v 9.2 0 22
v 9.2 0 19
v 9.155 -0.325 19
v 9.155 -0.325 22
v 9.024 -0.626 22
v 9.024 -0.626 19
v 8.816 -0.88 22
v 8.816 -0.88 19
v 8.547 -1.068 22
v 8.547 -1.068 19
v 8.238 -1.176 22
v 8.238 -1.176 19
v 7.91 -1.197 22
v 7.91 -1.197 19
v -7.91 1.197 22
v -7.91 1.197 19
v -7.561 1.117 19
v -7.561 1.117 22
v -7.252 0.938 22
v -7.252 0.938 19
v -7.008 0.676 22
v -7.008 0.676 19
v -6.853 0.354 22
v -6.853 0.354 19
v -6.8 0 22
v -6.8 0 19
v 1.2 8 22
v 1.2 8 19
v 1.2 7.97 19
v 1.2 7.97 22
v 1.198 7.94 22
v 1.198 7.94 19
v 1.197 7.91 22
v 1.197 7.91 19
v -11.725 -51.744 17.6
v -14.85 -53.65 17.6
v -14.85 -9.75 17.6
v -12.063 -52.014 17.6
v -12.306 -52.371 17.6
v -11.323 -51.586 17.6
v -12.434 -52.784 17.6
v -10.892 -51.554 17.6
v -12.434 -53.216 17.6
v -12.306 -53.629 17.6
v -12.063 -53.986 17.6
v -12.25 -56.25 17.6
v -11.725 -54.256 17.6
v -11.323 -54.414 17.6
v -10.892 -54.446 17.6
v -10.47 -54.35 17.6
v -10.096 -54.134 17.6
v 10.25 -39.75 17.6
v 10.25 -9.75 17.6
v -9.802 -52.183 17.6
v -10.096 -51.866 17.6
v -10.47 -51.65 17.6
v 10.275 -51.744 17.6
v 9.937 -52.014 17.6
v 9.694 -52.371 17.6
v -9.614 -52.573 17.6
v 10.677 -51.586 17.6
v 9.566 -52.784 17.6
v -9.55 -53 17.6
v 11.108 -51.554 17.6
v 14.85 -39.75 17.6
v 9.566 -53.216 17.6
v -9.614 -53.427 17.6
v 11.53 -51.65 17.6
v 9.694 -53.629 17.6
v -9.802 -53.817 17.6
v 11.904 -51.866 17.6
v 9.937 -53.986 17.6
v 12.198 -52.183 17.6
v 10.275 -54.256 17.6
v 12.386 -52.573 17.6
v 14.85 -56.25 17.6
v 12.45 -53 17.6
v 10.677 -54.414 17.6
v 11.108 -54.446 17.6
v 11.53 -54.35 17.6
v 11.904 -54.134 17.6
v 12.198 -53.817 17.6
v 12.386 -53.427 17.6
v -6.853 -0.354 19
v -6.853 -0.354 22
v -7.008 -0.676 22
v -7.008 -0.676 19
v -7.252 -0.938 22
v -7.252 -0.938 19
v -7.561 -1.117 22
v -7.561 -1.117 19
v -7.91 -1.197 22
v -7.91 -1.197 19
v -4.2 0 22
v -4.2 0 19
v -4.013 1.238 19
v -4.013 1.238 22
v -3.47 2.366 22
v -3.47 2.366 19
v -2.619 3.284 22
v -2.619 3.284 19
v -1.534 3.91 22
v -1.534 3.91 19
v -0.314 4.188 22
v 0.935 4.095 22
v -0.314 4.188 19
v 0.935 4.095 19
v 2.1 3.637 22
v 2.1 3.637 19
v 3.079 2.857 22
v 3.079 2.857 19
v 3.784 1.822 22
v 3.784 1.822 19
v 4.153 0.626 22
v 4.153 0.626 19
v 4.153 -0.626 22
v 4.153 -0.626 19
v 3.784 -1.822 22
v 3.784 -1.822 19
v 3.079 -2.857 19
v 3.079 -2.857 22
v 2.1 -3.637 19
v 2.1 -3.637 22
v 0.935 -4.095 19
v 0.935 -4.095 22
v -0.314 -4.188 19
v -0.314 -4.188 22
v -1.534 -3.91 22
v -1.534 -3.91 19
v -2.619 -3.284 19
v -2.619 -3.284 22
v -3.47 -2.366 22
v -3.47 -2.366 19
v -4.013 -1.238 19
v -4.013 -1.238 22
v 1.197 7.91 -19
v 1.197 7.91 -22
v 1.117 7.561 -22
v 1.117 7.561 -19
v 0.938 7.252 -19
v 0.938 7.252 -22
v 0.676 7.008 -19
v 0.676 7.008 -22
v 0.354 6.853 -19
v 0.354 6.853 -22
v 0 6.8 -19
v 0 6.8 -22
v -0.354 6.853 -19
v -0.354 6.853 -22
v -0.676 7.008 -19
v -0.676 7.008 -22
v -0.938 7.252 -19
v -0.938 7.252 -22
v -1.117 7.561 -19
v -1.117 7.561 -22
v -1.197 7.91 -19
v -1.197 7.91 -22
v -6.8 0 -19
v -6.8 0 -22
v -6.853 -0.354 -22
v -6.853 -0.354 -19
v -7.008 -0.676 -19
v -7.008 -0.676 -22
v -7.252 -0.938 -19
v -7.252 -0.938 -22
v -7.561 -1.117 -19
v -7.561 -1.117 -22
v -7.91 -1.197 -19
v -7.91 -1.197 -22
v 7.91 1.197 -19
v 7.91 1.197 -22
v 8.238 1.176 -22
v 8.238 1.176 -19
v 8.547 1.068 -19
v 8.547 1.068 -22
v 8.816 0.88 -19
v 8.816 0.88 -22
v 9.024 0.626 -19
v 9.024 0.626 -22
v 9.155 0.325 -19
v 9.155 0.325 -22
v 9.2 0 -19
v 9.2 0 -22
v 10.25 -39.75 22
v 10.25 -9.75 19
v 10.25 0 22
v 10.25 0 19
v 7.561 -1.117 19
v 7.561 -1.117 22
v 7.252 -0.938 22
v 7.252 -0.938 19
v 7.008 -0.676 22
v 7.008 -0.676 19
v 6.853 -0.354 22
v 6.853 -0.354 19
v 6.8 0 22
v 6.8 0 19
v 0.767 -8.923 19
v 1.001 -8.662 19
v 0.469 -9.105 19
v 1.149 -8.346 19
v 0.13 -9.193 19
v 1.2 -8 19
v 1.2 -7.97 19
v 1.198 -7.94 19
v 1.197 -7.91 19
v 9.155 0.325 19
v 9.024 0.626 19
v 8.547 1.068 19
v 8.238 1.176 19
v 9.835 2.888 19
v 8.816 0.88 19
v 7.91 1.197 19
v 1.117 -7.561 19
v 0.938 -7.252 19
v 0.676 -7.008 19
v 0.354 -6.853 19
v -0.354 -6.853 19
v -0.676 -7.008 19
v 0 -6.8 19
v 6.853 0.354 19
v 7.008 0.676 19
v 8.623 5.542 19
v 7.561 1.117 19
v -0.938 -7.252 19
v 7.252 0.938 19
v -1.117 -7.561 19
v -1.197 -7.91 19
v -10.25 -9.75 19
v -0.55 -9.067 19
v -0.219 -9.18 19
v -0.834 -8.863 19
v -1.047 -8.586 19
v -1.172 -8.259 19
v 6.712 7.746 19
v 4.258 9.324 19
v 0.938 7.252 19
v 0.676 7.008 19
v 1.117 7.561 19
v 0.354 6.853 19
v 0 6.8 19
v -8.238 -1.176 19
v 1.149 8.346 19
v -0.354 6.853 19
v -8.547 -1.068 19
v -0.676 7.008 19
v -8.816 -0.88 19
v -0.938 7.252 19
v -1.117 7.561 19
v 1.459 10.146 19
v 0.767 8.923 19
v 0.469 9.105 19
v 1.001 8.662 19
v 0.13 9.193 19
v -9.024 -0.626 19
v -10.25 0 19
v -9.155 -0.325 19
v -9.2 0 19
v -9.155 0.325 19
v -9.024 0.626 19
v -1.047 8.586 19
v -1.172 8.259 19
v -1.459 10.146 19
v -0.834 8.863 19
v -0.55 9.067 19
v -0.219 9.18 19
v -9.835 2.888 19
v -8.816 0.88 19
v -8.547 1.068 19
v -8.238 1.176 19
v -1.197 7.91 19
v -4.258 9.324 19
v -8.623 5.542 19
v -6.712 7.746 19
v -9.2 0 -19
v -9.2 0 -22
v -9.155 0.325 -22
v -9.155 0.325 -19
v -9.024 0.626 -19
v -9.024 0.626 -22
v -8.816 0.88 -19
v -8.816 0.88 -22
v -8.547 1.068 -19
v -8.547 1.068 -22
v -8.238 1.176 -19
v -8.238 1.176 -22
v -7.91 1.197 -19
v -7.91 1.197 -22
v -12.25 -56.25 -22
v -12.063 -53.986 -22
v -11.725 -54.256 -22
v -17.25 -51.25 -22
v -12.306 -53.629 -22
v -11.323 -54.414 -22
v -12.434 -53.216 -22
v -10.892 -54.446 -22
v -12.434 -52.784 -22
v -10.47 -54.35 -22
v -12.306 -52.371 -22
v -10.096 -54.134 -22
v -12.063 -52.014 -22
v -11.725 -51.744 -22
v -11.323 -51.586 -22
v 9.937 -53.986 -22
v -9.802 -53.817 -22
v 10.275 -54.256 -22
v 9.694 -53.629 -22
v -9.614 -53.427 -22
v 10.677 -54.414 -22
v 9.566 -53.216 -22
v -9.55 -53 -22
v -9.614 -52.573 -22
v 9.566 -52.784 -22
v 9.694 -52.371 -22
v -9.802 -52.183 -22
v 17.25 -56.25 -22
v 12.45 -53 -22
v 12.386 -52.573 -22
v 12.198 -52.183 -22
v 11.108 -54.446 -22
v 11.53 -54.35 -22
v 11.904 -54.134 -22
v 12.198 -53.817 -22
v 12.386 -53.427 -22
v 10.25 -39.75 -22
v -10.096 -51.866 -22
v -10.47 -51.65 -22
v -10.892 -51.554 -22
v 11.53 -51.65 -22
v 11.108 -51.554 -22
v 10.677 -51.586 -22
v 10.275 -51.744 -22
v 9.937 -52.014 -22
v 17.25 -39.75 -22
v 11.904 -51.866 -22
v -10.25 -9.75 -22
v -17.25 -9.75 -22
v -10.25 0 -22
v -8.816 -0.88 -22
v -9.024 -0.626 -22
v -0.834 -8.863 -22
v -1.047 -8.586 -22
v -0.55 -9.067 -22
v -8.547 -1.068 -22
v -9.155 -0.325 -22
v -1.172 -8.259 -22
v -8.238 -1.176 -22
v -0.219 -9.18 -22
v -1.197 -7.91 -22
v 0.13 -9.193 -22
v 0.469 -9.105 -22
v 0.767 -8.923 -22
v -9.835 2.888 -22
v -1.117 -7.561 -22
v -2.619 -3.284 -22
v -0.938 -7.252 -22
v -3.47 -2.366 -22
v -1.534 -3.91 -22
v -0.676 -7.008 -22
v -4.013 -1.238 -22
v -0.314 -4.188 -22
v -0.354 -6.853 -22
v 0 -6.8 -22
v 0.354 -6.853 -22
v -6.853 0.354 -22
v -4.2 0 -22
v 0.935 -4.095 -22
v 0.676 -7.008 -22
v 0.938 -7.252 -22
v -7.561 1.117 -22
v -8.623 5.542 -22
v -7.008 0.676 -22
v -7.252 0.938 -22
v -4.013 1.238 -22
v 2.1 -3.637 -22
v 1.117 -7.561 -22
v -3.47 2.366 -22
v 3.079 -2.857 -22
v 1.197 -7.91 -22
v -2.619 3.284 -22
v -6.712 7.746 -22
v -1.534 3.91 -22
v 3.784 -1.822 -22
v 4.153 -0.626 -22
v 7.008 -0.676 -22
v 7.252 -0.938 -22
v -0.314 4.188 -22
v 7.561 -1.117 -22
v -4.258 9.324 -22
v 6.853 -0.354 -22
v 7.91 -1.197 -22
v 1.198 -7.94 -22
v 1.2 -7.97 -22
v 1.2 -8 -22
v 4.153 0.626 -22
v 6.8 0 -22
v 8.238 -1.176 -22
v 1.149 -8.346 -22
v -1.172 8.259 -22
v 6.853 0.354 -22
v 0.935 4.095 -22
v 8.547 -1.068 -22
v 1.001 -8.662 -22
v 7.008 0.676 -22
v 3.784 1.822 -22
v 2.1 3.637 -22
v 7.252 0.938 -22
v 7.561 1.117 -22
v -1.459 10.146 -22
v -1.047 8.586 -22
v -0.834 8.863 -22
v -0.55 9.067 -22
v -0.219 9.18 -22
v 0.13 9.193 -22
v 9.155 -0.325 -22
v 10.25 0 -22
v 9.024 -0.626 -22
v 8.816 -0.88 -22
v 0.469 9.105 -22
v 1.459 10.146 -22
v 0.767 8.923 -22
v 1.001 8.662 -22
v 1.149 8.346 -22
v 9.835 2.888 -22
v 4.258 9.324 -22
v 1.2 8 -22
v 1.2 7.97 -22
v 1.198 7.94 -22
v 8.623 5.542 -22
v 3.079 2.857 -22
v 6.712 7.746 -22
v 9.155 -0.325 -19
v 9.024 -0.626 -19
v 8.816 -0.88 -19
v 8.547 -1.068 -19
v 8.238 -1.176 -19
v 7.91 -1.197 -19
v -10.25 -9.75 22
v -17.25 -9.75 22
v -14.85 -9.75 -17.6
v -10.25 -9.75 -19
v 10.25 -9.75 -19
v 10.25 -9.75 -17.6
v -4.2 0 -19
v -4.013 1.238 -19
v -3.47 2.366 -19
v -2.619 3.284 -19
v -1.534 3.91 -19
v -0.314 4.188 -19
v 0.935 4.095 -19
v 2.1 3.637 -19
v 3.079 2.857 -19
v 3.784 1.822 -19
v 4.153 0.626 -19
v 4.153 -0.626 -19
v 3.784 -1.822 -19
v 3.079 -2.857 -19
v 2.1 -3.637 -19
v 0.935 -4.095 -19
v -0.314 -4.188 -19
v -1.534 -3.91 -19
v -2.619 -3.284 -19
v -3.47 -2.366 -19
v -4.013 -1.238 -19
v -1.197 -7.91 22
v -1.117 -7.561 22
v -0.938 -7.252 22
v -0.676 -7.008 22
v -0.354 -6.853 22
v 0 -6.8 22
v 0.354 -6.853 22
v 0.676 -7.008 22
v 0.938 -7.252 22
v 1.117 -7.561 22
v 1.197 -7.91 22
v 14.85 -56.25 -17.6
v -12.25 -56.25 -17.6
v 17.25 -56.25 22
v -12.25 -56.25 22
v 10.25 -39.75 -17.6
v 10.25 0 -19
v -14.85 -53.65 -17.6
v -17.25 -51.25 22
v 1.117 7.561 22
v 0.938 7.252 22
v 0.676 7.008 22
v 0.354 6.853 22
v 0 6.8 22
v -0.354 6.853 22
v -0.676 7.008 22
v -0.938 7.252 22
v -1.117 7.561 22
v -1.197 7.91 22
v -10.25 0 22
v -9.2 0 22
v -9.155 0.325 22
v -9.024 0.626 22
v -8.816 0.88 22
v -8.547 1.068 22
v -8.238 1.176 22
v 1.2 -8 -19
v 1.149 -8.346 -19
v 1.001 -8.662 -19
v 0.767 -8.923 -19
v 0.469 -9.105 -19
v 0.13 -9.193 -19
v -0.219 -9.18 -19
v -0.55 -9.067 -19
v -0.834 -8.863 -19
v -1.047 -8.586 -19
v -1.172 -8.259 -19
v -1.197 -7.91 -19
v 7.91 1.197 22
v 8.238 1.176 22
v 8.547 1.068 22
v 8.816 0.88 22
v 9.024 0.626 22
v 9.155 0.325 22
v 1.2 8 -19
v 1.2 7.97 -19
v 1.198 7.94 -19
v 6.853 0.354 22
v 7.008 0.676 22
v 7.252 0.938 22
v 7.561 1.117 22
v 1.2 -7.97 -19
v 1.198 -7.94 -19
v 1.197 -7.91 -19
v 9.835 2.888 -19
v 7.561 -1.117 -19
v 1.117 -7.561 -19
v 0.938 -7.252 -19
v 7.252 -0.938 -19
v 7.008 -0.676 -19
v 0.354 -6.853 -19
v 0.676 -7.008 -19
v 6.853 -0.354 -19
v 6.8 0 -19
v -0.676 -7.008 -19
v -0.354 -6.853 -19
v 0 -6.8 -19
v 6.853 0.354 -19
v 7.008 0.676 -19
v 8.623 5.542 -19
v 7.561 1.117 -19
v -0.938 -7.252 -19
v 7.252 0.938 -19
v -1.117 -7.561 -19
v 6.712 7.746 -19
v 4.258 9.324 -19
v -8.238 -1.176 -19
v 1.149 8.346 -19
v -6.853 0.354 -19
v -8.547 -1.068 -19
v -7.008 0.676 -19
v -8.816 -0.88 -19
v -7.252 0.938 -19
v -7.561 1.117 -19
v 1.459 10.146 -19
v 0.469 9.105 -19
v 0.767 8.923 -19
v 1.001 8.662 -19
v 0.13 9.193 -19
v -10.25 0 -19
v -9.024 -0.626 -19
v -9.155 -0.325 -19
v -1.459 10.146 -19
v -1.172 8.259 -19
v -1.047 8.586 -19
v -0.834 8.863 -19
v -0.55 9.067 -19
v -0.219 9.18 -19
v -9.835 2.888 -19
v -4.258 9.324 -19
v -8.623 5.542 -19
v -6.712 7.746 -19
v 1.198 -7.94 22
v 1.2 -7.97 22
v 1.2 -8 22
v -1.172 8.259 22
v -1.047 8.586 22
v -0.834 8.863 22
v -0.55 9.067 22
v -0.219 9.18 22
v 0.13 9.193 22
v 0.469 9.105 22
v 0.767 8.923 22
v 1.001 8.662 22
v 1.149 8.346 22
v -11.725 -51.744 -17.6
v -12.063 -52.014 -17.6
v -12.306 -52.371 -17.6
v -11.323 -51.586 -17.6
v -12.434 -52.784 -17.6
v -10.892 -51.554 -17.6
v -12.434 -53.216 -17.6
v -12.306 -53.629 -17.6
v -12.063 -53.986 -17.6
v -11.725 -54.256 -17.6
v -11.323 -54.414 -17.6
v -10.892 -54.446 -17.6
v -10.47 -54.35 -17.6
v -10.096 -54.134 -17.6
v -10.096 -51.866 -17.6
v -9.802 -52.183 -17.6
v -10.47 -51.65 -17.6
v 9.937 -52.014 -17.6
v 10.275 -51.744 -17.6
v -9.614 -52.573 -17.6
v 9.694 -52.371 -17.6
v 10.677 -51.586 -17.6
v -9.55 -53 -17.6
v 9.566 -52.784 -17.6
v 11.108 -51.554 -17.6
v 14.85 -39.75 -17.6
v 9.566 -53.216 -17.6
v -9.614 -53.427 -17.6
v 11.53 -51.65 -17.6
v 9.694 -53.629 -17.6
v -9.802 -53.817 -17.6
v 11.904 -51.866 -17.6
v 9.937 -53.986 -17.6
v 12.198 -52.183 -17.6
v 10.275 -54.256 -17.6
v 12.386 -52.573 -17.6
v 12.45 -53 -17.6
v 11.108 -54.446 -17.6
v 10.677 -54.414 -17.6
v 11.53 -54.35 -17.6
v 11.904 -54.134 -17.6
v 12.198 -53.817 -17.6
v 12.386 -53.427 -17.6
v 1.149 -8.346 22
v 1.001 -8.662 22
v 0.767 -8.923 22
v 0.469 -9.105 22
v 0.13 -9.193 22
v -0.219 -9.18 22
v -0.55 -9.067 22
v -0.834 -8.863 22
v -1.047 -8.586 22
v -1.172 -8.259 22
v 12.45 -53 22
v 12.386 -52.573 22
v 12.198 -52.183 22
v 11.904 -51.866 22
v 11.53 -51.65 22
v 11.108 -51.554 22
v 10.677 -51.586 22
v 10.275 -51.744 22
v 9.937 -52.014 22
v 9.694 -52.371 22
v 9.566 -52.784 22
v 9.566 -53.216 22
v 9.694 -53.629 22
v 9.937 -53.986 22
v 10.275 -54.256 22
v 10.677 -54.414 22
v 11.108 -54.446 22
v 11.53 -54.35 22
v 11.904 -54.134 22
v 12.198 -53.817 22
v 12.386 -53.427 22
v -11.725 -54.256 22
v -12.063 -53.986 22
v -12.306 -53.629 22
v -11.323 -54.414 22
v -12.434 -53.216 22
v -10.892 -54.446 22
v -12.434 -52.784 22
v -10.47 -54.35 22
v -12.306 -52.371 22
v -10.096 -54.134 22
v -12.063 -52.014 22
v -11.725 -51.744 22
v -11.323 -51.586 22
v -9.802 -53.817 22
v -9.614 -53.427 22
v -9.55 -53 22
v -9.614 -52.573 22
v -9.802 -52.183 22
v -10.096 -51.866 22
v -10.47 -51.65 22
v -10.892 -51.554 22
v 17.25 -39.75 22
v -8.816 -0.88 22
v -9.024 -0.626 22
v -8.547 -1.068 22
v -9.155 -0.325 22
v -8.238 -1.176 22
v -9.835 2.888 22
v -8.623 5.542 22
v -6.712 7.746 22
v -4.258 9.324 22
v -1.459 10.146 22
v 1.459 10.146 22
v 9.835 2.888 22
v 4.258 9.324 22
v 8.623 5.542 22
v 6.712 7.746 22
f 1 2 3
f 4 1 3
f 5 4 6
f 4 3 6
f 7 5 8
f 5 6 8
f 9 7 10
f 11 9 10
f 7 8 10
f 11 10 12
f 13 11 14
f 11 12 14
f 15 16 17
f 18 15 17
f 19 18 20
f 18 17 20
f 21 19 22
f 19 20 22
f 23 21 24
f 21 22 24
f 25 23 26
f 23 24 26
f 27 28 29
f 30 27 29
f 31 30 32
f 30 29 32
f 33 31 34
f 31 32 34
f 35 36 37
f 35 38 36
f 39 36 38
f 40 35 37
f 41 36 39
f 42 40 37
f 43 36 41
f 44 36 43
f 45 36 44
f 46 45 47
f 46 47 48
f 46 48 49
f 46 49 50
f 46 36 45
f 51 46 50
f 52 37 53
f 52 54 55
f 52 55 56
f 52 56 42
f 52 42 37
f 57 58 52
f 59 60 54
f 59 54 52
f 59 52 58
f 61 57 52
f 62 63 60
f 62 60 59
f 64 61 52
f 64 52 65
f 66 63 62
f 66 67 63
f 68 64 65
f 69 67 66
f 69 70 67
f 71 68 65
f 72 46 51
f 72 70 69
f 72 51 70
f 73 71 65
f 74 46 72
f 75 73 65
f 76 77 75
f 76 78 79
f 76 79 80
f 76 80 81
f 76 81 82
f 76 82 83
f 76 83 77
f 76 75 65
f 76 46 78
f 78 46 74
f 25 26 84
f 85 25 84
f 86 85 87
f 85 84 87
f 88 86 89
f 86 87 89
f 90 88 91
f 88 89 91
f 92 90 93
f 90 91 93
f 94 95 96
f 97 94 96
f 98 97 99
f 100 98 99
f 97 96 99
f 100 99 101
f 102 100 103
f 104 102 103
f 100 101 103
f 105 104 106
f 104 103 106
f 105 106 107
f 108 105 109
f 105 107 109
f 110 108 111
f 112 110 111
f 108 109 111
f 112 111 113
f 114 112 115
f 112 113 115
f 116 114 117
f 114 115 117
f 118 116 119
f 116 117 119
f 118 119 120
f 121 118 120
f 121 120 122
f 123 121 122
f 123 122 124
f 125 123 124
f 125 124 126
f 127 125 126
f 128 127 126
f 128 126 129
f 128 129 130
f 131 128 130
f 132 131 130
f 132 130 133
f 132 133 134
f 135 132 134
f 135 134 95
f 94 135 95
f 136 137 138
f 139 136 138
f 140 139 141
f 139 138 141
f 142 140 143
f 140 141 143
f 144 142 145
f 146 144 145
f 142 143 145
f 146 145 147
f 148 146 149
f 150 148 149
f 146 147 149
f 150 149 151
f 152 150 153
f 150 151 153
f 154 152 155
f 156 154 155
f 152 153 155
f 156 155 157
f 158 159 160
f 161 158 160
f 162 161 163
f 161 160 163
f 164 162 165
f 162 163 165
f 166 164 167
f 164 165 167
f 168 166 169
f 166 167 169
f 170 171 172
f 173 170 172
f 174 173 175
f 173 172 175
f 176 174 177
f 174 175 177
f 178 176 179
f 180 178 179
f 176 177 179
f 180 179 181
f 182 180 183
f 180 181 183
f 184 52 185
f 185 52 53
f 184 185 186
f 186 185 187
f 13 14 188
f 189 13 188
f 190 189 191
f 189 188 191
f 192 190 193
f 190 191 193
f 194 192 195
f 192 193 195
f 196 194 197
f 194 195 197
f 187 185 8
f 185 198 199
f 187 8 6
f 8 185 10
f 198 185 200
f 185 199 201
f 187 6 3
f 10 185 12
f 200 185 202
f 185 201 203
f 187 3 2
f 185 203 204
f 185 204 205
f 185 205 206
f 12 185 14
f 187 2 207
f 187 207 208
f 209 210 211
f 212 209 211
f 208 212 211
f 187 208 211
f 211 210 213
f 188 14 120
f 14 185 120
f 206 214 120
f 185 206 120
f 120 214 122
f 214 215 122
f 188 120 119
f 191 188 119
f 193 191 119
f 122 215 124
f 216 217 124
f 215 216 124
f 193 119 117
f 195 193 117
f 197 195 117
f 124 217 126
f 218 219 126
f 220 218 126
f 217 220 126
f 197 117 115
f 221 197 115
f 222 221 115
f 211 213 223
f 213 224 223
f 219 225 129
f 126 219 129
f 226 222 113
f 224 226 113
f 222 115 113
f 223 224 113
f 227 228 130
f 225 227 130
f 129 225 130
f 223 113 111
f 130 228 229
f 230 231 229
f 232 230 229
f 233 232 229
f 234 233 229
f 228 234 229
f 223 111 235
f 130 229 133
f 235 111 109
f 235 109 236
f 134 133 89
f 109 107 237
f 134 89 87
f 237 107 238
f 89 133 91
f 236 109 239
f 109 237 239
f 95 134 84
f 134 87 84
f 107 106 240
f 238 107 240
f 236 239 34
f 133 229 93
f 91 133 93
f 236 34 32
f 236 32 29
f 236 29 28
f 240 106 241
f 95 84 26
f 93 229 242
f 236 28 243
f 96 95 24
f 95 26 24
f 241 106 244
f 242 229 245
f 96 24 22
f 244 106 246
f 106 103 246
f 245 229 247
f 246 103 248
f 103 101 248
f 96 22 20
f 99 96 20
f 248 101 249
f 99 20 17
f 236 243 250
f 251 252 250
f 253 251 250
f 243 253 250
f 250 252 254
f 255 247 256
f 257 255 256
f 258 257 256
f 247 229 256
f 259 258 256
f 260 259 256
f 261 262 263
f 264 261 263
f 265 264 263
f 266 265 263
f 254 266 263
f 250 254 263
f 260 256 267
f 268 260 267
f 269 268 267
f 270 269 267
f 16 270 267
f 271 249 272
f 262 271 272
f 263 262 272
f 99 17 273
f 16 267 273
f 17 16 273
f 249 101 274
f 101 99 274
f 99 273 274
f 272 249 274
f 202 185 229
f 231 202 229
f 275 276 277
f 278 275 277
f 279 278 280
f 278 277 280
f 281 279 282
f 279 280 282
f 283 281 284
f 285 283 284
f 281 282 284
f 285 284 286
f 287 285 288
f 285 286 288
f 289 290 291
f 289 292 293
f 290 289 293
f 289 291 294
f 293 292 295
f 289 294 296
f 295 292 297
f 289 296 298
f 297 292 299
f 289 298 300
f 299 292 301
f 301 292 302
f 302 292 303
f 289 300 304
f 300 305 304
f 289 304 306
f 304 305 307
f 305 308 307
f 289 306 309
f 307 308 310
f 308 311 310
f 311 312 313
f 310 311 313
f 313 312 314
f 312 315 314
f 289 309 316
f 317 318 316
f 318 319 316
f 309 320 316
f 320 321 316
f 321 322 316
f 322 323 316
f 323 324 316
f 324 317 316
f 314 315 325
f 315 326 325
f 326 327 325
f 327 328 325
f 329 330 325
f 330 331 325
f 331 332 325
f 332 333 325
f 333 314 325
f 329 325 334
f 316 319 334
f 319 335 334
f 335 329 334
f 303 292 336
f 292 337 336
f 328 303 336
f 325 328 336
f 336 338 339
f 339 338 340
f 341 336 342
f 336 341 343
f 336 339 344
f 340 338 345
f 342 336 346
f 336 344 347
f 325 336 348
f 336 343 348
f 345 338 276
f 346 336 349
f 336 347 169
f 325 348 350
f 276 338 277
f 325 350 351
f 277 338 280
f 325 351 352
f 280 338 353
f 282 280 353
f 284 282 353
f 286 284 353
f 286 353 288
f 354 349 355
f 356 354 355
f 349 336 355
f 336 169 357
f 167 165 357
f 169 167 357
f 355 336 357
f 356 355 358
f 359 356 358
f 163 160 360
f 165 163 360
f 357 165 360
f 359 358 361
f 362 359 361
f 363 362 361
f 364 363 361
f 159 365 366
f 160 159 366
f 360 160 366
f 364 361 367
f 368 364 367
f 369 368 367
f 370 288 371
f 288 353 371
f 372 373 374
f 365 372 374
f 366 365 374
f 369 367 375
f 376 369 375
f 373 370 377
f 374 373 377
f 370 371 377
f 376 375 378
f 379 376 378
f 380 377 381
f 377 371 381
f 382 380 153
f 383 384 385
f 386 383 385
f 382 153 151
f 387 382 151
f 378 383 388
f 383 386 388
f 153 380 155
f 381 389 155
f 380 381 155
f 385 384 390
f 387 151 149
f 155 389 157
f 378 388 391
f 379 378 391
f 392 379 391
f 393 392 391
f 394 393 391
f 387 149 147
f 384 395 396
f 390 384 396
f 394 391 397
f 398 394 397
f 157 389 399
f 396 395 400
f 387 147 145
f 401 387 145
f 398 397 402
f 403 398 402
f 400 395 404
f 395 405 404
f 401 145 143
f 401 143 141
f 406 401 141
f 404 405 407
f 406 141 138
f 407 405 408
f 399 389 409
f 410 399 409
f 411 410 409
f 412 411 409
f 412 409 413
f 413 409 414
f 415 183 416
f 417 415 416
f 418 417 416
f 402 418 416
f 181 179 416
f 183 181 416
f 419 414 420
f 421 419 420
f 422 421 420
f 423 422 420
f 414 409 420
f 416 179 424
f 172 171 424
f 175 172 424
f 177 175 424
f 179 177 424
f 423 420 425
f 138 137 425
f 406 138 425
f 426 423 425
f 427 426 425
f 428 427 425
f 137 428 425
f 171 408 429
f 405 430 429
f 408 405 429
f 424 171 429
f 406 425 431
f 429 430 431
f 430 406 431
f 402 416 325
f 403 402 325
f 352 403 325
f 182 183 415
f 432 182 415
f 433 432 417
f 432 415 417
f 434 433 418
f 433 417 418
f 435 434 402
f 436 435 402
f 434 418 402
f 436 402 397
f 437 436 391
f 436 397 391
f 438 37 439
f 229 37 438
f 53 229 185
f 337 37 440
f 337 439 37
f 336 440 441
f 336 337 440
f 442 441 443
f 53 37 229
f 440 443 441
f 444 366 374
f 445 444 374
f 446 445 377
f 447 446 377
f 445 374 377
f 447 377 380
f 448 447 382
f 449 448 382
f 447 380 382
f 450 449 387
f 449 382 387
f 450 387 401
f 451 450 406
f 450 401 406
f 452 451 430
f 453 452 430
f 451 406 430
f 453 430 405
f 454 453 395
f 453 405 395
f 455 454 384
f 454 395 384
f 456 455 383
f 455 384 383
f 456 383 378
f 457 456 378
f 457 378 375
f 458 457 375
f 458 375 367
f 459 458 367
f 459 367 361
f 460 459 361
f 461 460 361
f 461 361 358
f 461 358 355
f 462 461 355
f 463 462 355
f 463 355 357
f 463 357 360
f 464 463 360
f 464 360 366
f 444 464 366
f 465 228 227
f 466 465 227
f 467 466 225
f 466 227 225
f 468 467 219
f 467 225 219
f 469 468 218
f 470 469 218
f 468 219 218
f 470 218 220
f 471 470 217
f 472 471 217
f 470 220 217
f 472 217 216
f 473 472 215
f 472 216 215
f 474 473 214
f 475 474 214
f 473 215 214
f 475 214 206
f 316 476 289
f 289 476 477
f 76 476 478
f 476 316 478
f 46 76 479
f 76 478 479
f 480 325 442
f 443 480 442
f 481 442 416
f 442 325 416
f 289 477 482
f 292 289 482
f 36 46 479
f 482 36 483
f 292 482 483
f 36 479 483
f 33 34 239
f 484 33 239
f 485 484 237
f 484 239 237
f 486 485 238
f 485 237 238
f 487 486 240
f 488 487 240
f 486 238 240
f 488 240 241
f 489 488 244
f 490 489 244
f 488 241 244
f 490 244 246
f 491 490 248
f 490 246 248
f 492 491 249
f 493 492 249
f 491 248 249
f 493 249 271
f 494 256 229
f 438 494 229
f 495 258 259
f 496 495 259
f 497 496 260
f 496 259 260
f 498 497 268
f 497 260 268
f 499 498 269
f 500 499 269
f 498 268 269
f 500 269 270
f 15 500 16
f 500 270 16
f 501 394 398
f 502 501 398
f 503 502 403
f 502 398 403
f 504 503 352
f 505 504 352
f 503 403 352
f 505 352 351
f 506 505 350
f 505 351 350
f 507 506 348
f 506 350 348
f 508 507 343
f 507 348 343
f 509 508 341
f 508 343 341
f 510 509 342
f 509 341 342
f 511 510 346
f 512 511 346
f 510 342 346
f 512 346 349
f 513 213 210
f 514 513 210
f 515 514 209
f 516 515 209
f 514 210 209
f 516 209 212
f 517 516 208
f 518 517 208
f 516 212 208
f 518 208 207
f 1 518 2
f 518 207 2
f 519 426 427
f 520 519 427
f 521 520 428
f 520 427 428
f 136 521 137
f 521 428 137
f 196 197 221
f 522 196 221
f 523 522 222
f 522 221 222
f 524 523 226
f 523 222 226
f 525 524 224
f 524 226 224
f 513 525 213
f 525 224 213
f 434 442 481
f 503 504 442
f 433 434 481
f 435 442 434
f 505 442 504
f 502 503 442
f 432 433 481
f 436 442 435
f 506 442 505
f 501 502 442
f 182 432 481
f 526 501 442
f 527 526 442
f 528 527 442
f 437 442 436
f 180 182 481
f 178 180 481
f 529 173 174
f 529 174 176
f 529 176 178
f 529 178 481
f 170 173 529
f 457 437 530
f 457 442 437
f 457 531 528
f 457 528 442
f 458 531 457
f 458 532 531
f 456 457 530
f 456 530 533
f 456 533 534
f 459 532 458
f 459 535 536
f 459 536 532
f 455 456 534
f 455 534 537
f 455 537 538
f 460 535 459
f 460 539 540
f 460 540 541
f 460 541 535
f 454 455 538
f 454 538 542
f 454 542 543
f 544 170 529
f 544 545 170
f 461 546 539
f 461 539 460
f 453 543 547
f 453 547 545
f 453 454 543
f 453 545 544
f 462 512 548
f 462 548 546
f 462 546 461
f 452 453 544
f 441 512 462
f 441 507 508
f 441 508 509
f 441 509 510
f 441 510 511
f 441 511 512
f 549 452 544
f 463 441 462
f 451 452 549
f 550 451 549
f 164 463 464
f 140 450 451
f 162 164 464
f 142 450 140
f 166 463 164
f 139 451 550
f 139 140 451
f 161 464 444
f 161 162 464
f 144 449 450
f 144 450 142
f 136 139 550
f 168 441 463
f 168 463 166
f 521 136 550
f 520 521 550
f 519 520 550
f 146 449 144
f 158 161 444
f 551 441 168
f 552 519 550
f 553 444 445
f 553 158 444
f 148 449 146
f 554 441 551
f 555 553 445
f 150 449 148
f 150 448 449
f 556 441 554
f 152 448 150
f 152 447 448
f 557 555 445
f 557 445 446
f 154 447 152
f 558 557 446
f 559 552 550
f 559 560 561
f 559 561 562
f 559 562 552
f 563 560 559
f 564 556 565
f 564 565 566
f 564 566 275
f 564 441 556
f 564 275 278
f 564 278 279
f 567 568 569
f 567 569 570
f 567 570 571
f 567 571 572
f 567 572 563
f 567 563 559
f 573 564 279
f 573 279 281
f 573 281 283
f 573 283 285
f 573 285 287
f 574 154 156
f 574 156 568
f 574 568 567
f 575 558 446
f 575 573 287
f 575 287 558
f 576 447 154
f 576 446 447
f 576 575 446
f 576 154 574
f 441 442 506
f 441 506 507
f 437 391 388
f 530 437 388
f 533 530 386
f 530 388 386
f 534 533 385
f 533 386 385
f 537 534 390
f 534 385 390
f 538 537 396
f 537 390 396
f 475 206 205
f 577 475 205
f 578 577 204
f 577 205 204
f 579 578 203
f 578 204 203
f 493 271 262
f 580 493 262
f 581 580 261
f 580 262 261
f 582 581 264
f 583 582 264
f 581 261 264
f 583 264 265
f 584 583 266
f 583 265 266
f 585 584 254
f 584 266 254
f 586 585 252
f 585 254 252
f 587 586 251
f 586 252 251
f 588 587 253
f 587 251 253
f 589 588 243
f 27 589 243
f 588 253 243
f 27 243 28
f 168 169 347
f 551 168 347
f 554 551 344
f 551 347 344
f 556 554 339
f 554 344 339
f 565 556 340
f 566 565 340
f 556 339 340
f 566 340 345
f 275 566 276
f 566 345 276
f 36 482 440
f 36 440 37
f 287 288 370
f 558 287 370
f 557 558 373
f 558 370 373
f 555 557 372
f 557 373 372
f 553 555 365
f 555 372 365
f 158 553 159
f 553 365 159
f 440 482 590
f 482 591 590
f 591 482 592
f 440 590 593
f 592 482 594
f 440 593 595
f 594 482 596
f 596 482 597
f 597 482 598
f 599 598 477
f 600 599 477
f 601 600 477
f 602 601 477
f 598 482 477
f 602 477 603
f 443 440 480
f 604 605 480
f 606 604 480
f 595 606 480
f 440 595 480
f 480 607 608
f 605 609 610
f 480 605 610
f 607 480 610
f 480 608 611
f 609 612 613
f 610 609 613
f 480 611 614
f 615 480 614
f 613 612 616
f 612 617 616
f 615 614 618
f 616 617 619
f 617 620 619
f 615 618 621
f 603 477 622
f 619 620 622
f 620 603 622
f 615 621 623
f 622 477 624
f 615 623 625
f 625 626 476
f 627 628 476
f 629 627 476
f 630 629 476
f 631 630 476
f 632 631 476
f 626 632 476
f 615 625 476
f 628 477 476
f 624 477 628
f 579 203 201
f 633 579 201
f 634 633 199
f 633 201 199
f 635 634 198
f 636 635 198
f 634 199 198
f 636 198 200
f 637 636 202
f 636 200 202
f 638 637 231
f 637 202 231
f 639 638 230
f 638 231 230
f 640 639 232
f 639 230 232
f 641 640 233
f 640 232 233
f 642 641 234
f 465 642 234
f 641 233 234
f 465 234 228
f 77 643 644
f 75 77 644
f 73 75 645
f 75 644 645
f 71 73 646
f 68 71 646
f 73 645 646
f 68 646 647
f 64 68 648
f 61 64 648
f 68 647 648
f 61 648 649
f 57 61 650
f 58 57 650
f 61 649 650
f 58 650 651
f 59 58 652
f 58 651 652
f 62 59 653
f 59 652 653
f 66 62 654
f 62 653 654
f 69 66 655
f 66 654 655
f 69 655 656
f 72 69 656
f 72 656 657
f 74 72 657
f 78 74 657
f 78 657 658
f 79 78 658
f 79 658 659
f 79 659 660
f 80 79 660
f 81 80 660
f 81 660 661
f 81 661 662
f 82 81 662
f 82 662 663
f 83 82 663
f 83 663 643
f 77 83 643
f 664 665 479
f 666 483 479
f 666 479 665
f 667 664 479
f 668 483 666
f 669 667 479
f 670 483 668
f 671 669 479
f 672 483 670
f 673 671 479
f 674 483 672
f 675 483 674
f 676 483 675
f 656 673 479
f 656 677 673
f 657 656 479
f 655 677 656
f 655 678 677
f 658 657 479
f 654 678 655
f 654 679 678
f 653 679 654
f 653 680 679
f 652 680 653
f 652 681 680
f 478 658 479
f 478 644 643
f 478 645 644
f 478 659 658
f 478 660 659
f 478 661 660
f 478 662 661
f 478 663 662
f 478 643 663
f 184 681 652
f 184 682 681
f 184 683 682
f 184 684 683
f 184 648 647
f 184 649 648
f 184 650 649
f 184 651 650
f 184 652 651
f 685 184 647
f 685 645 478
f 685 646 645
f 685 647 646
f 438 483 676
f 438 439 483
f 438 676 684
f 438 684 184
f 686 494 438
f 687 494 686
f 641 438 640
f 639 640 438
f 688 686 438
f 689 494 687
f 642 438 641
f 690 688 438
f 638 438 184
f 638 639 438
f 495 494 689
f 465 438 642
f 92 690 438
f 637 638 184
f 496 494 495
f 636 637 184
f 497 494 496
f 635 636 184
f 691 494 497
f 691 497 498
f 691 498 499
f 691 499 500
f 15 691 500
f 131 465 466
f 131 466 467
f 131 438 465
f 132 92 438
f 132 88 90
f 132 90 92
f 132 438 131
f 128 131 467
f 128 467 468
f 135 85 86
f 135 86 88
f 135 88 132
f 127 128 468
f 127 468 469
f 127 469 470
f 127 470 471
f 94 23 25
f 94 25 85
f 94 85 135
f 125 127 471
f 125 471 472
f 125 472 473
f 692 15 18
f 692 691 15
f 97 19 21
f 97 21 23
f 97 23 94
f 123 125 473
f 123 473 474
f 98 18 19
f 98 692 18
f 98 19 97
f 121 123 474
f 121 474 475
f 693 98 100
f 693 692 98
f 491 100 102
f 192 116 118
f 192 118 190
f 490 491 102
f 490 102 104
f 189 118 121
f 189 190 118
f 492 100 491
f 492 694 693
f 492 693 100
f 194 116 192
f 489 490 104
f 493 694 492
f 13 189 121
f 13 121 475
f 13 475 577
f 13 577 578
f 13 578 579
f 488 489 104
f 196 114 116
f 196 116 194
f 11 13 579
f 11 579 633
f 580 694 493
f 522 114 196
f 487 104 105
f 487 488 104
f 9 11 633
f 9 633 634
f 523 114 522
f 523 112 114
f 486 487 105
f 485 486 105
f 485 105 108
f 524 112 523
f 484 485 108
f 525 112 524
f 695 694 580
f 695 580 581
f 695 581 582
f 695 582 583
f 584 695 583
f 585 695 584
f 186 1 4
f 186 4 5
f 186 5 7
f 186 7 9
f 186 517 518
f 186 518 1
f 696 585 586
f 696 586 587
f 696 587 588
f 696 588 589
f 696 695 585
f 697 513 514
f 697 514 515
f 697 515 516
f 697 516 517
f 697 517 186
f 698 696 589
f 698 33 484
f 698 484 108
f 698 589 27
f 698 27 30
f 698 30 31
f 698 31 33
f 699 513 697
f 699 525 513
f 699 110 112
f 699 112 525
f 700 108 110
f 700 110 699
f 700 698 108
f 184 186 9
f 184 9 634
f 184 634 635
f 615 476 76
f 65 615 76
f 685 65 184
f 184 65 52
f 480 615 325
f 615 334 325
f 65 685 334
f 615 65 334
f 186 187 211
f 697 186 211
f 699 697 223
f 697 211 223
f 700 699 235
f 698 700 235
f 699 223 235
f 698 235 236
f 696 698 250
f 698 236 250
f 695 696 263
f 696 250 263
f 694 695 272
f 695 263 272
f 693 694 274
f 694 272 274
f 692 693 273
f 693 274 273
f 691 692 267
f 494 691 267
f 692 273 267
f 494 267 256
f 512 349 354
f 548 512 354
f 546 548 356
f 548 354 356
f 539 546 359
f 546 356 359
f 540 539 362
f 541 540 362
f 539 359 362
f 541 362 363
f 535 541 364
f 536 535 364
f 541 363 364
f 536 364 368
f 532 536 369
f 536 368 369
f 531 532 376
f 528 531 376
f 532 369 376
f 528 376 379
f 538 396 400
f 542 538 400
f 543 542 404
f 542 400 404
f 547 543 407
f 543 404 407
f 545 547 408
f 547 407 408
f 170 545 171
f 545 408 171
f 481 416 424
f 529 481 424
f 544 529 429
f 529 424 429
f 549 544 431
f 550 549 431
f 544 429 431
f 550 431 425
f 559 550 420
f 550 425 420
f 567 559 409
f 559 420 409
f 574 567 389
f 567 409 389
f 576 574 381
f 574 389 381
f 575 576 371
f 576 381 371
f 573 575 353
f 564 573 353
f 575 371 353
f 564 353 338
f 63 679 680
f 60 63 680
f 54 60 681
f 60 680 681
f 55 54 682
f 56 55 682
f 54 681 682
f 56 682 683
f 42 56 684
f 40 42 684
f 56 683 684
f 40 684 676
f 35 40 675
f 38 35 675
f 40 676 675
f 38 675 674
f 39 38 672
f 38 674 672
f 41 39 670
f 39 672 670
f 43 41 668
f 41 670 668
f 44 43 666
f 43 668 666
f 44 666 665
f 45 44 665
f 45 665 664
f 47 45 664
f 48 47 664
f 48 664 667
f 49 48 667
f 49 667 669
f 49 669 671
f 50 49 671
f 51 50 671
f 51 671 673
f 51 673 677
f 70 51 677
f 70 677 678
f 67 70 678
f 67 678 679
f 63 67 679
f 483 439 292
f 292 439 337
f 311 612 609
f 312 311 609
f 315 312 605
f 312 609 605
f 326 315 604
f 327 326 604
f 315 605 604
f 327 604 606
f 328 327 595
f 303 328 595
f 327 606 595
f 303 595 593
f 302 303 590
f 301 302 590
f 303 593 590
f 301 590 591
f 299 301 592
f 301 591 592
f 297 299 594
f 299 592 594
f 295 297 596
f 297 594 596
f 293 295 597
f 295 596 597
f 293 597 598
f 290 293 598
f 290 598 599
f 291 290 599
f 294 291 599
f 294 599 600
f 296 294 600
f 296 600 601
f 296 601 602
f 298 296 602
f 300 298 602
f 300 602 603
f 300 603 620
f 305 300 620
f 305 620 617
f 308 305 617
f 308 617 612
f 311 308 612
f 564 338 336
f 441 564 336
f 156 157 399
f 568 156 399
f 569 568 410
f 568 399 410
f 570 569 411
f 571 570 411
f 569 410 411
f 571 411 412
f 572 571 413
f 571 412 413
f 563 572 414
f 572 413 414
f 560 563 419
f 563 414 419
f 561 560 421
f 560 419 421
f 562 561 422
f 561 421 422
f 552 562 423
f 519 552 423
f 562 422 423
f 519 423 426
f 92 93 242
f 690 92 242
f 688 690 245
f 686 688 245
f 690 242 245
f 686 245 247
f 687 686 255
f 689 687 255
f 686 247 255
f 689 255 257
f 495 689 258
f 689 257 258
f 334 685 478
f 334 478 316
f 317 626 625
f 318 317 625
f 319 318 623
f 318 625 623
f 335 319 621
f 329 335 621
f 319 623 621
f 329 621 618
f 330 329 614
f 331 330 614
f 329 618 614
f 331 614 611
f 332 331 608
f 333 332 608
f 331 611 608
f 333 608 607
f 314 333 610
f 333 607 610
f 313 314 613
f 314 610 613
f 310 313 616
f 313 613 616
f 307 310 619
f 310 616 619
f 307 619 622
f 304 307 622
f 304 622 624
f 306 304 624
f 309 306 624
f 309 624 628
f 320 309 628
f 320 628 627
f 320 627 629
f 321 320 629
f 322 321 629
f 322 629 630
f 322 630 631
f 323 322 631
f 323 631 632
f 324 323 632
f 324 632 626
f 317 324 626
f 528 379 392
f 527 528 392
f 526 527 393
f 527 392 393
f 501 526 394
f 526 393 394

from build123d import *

# Parameters (mm, degrees)
BOSS_EXTRUDE1_DEPTH      = 22
BOSS_EXTRUDE1_DEPTH_BACK = 22
SKETCH2_W                = 38
SKETCH2_H                = 20
CUT_EXTRUDE1_DEPTH       = 105.423416914
SKETCH3_W                = 7
SKETCH3_H                = 44
BOSS_EXTRUDE2_DEPTH      = 65.5
SKETCH23_R               = 5
SKETCH23_R_2             = 1.2
CUT_EXTRUDE2_DEPTH       = 111.605436123
SKETCH24_W               = 28.5
SKETCH24_H               = 34
CUT_EXTRUDE3_DEPTH       = 90.954502389
SKETCH26_R               = 1.2
SKETCH26_R_2             = 5
SKETCH26_R_3             = 1.45
CUT_EXTRUDE6_DEPTH       = 107.330263801
SKETCH27_W               = 29.7
SKETCH27_H               = 35.2
CUT_EXTRUDE8_DEPTH       = 73.137455597
SKETCH29_W               = 7
SKETCH29_H               = 30
CUT_EXTRUDE10_DEPTH      = 74.468530678
CHAMFER2_SIZE            = 5


with BuildPart() as part:
    # Sketch1 → Boss-Extrude1 (new, two sides: drawn at the far end of the back side and taken through both)
    with BuildSketch(Plane.XY.offset(-BOSS_EXTRUDE1_DEPTH_BACK)):
        with BuildLine():
            Line((10.25, -60), (10.25, 0))
            ThreePointArc((10.25, 0), (0, -10.25), (-10.25, 0))
            Line((-10.25, 0), (-10.25, -60))
            Line((-10.25, -60), (-10.25, -100))
            Line((-10.25, -100), (10.25, -100))
            Line((10.25, -100), (10.25, -60))
        make_face()
        with BuildLine():
            Line((10.25, 0), (9.2, 0))
            ThreePointArc((9.2, 0), (8.816088231, -0.879772698), (7.91, -1.196620241))
            ThreePointArc((7.91, -1.196620241), (5.656854249, -5.656854249), (1.196620241, -7.91))
            ThreePointArc((1.196620241, -7.91), (1.199154762, -7.954968281), (1.2, -8))
            ThreePointArc((1.2, -8), (-0.045031719, -9.199154762), (-1.196620241, -7.91))
            ThreePointArc((-1.196620241, -7.91), (-5.656854249, -5.656854249), (-7.91, -1.196620241))
            ThreePointArc((-7.91, -1.196620241), (-8.816088231, -0.879772698), (-9.2, 0))
            Line((-9.2, 0), (-10.25, 0))
            ThreePointArc((-10.25, 0), (0, -10.25), (10.25, 0))
        make_face()
        with BuildLine():
            ThreePointArc((7.91, -1.196620241), (7.120227302, -0.816088231), (6.8, 0))
            Line((6.8, 0), (4.2, 0))
            ThreePointArc((4.2, 0), (0, -4.2), (-4.2, 0))
            Line((-4.2, 0), (-6.8, 0))
            ThreePointArc((-6.8, 0), (-7.120227302, -0.816088231), (-7.91, -1.196620241))
            ThreePointArc((-7.91, -1.196620241), (-5.656854249, -5.656854249), (-1.196620241, -7.91))
            ThreePointArc((-1.196620241, -7.91), (0, -6.8), (1.196620241, -7.91))
            ThreePointArc((1.196620241, -7.91), (5.656854249, -5.656854249), (7.91, -1.196620241))
        make_face()
        with BuildLine():
            Line((4.2, 0), (6.8, 0))
            ThreePointArc((6.8, 0), (7.120227302, 0.816088231), (7.91, 1.196620241))
            ThreePointArc((7.91, 1.196620241), (5.656854249, 5.656854249), (1.196620241, 7.91))
            ThreePointArc((1.196620241, 7.91), (0, 6.8), (-1.196620241, 7.91))
            ThreePointArc((-1.196620241, 7.91), (-5.656854249, 5.656854249), (-7.91, 1.196620241))
            ThreePointArc((-7.91, 1.196620241), (-7.120227302, 0.816088231), (-6.8, 0))
            Line((-6.8, 0), (-4.2, 0))
            ThreePointArc((-4.2, 0), (0, 4.2), (4.2, 0))
        make_face()
        with BuildLine():
            ThreePointArc((7.91, 1.196620241), (8.816088231, 0.879772698), (9.2, 0))
            Line((9.2, 0), (10.25, 0))
            ThreePointArc((10.25, 0), (0, 10.25), (-10.25, 0))
            Line((-10.25, 0), (-9.2, 0))
            ThreePointArc((-9.2, 0), (-8.816088231, 0.879772698), (-7.91, 1.196620241))
            ThreePointArc((-7.91, 1.196620241), (-5.656854249, 5.656854249), (-1.196620241, 7.91))
            ThreePointArc((-1.196620241, 7.91), (-0.045031719, 9.199154762), (1.2, 8))
            ThreePointArc((1.2, 8), (1.199154762, 7.954968281), (1.196620241, 7.91))
            ThreePointArc((1.196620241, 7.91), (5.656854249, 5.656854249), (7.91, 1.196620241))
        make_face()
    extrude(amount=BOSS_EXTRUDE1_DEPTH + BOSS_EXTRUDE1_DEPTH_BACK)

    # Sketch2 → Cut-Extrude1 (cut, through all)
    with BuildSketch(Plane.ZY.offset(10.25)):
        with Locations((0, 0.25)):
            Rectangle(SKETCH2_W, SKETCH2_H)
    extrude(amount=-CUT_EXTRUDE1_DEPTH, mode=Mode.SUBTRACT)

    # Sketch3 → Boss-Extrude2 (add)
    with BuildSketch(Plane(origin=(0, -9.75, 0), x_dir=(1, 0, 0), z_dir=(0, 1, 0))):
        with Locations((-13.75, 0)):
            Rectangle(SKETCH3_W, SKETCH3_H)
        with Locations((13.75, 0)):
            Rectangle(SKETCH3_W, SKETCH3_H)
    extrude(amount=-BOSS_EXTRUDE2_DEPTH)

    # Sketch23 → Cut-Extrude2 (cut, through all)
    with BuildSketch(Plane.XY.offset(22)):
        with BuildLine():
            Line((-10.25, -100), (10.25, -100))
            Line((10.25, -100), (10.25, -85))
            ThreePointArc((10.25, -85), (0, -95.25), (-10.25, -85))
            Line((-10.25, -85), (-10.25, -100))
        make_face()
        with Locations((0, -85)):
            Circle(SKETCH23_R)
        with Locations((8, -85)):
            Circle(SKETCH23_R_2)
        with Locations((0, -77)):
            Circle(SKETCH23_R_2)
        with Locations((0, -93)):
            Circle(SKETCH23_R_2)
        with Locations((-8, -85)):
            Circle(SKETCH23_R_2)
    extrude(amount=-CUT_EXTRUDE2_DEPTH, mode=Mode.SUBTRACT)

    # Sketch24 → Cut-Extrude3 (cut, through all)
    with BuildSketch(Plane(origin=(0, -9.75, 0), x_dir=(1, 0, 0), z_dir=(0, 1, 0))):
        Rectangle(SKETCH24_W, SKETCH24_H)
    extrude(amount=-CUT_EXTRUDE3_DEPTH, mode=Mode.SUBTRACT)

    # Sketch26 → Cut-Extrude6 (cut, through all)
    # profile 1 of 5: a face of its own
    with BuildSketch(Plane.XY.offset(22)):
        with BuildLine():
            Line((10.25, -75.25), (14.25, -75.25))
            Line((14.25, -75.25), (14.25, -56.53282359))
            Line((14.25, -56.53282359), (14.25, -56.25))
            Line((14.25, -56.25), (-14.25, -56.25))
            Line((-14.25, -56.25), (-14.25, -56.53282359))
            Line((-14.25, -56.53282359), (-14.25, -75.25))
            Line((-14.25, -75.25), (-10.25, -75.25))
            Line((-10.25, -75.25), (-10.25, -85))
            ThreePointArc((-10.25, -85), (0, -95.25), (10.25, -85))
            Line((10.25, -85), (10.25, -75.25))
        make_face()
        with Locations((-8, -85)):
            Circle(SKETCH26_R, mode=Mode.SUBTRACT)
        with Locations((0, -85)):
            Circle(SKETCH26_R_2, mode=Mode.SUBTRACT)
        with Locations((0, -77)):
            Circle(SKETCH26_R, mode=Mode.SUBTRACT)
        with Locations((0, -93)):
            Circle(SKETCH26_R, mode=Mode.SUBTRACT)
        with Locations((8, -85)):
            Circle(SKETCH26_R, mode=Mode.SUBTRACT)
    # profile 2 of 5: a face of its own
    with BuildSketch(Plane.XY.offset(22)):
        Polygon((-17.25, -75.25), (-14.25, -75.25), (-14.25, -56.53282359), (-14.25, -56.25), (-17.25, -56.25), align=None)
    # profile 3 of 5: a face of its own
    with BuildSketch(Plane.XY.offset(22)):
        Polygon((14.25, -56.53282359), (14.25, -75.25), (17.25, -75.25), (17.25, -56.25), (14.25, -56.25), align=None)
    # profile 4 of 5: a face of its own
    with BuildSketch(Plane.XY.offset(22)):
        with Locations((-11, -53)):
            Circle(SKETCH26_R_3)
    # profile 5 of 5: a face of its own
    with BuildSketch(Plane.XY.offset(22)):
        with Locations((11, -53)):
            Circle(SKETCH26_R_3)
    extrude(amount=-CUT_EXTRUDE6_DEPTH, mode=Mode.SUBTRACT)

    # Sketch27 → Cut-Extrude8 (cut, through all)
    with BuildSketch(Plane.XZ.offset(56.25)):
        Rectangle(SKETCH27_W, SKETCH27_H)
    extrude(amount=-CUT_EXTRUDE8_DEPTH, mode=Mode.SUBTRACT)

    # Sketch29 → Cut-Extrude10 (cut, through all)
    with BuildSketch(Plane(origin=(0, 0, -22), x_dir=(-1, 0, 0), z_dir=(0, 0, -1))):
        with Locations((-13.75, -24.75)):
            Rectangle(SKETCH29_W, SKETCH29_H)
    extrude(amount=-CUT_EXTRUDE10_DEPTH, mode=Mode.SUBTRACT)

    # Chamfer2
    # the kernel refuses this chamfer: 5 mm, written as the material it takes off along each edge
    with BuildSketch(Plane(origin=(-17.25, -56.25, 34.85841494), x_dir=(0.9996219169112968, -0.027495876610586327, 0), z_dir=(0, 0, -1))) as chamfer2_piece_1:
        Polygon((CHAMFER2_SIZE * 0.999621916911, -CHAMFER2_SIZE * 0.0274958766106), (-CHAMFER2_SIZE * 0.0274958766106, -CHAMFER2_SIZE * 0.999621916911), (0, 0), align=None)
    extrude(amount=69.71682988, mode=Mode.SUBTRACT)


solid = part.part
